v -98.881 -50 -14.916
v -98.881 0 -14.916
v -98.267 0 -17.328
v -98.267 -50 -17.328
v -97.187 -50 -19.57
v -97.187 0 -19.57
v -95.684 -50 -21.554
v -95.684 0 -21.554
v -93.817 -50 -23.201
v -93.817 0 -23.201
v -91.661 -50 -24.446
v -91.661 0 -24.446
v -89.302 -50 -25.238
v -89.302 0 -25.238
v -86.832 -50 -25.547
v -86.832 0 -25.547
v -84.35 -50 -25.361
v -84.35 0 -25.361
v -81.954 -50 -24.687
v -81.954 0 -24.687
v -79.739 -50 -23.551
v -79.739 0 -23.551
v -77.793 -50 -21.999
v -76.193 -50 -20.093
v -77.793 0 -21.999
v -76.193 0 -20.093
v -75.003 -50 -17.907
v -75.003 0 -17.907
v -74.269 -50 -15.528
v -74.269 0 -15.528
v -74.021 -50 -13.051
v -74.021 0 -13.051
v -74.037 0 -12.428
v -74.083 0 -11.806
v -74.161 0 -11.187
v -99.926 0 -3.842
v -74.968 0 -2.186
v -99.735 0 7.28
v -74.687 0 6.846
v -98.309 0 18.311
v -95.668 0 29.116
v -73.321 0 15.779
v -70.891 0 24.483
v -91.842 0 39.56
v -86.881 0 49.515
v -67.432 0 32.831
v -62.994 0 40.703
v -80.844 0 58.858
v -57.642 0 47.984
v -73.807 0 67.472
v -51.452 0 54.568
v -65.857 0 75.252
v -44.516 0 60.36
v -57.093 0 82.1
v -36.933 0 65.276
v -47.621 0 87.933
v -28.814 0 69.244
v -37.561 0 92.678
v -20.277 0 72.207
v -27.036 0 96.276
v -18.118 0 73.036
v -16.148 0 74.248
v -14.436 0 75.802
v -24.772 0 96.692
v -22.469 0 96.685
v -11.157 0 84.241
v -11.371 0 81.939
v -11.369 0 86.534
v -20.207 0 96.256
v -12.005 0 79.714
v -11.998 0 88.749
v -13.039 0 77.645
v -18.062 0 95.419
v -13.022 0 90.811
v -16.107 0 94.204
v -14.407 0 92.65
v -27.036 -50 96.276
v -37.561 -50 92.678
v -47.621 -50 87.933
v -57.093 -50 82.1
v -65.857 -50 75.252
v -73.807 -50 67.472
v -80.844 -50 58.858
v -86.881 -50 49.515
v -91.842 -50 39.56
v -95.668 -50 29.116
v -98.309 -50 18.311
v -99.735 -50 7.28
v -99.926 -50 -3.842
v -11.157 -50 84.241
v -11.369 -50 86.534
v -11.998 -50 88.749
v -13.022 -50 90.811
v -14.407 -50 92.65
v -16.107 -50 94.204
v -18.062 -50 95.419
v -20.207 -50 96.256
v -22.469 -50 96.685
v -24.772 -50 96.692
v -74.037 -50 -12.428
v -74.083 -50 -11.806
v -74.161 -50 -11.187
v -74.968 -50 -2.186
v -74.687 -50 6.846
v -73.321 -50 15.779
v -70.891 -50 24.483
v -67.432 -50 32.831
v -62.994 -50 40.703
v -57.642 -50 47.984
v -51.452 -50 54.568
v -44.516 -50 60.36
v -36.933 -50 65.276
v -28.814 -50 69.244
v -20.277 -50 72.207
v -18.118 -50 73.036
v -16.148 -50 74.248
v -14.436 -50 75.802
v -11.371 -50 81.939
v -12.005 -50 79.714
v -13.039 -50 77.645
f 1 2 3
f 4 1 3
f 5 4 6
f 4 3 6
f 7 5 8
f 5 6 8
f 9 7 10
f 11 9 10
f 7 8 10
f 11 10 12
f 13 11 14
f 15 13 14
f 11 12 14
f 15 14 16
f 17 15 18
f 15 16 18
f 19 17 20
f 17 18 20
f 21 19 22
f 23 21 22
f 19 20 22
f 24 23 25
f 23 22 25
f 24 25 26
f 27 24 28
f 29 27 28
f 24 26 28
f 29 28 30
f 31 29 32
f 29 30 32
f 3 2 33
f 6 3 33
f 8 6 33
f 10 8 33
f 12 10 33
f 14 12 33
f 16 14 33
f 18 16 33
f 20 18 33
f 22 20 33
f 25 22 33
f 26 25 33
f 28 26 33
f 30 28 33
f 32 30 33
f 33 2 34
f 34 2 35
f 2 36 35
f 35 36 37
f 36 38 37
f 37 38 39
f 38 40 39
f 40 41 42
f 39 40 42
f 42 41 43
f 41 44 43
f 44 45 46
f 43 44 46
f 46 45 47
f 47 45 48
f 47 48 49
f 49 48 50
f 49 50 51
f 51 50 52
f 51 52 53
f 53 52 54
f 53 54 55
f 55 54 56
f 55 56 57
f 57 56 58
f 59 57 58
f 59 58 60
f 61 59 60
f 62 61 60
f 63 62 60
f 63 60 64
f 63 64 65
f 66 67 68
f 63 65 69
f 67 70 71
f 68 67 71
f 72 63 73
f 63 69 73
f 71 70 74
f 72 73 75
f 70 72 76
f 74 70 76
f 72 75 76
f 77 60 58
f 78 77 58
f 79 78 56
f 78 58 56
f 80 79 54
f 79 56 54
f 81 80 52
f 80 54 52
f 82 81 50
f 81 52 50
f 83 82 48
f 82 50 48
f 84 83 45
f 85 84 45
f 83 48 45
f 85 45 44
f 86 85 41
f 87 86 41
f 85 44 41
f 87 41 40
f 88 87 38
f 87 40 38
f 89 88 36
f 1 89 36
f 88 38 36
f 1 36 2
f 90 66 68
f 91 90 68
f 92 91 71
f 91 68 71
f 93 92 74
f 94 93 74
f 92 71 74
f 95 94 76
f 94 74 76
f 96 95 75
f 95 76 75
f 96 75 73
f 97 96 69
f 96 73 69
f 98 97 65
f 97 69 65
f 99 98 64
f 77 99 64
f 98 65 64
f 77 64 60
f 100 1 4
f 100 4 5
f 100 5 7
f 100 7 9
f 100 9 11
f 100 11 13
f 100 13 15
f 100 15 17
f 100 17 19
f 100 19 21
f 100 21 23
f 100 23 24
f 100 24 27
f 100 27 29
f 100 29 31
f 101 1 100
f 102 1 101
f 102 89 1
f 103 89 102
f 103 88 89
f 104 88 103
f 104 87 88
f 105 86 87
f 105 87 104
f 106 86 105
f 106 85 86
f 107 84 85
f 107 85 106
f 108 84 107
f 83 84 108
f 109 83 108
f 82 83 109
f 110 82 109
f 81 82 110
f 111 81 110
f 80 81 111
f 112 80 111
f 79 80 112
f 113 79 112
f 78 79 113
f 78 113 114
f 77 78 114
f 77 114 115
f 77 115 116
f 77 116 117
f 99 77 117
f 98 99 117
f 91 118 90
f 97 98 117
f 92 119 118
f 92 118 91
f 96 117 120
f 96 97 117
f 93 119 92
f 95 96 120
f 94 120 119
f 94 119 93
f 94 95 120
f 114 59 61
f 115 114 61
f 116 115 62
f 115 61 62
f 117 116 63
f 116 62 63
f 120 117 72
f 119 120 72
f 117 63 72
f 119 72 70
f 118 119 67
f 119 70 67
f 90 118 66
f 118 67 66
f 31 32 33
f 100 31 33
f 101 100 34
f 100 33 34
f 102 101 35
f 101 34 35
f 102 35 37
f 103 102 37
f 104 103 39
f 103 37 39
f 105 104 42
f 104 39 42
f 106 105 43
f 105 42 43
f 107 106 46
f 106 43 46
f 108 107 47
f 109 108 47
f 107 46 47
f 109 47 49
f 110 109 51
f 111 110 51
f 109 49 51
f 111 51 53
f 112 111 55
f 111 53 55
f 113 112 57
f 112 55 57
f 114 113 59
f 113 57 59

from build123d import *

# Parameters (mm, degrees)
F0_R     = 7.5
F2_DEPTH = 50


with BuildPart() as f2:
    # F0 (on Front) → F2 (new body)
    with BuildSketch(Plane.XZ):
        with BuildLine():
            ThreePointArc((-20.2771231268, 72.2069129495), (-35.691129754, 80.8618774554), (-27.0361647105, 96.2758837807))
            ThreePointArc((-27.0361647105, 96.2758837807), (-83.9922641187, 54.2706142236), (-98.8813425816, -14.9157664658))
            ThreePointArc((-98.8813425816, -14.9157664658), (-88.3856453807, -0.6911276961), (-74.161006875, -11.1868252548))
            ThreePointArc((-74.161006875, -11.1868252548), (-62.9941980859, 40.7029606726), (-20.2771231268, 72.2069129495))
        make_face()
        with BuildLine():
            ThreePointArc((-11.1566443384, 84.2413982472), (-16.1066113799, 94.2036772197), (-27.0361647105, 96.2758837807))
            ThreePointArc((-27.0361647105, 96.2758837807), (-35.691129754, 80.8618774554), (-20.2771231268, 72.2069129495))
            ThreePointArc((-20.2771231268, 72.2069129495), (-13.6943651026, 76.6913656362), (-11.1566443384, 84.2413982472))
        make_face()
        with Locations((-23.6566443384, 84.2413982472)):
            Circle(F0_R, mode=Mode.SUBTRACT)
        with BuildLine():
            ThreePointArc((-74.161006875, -11.1868252548), (-88.3856453807, -0.6911276961), (-98.8813425816, -14.9157664658))
            ThreePointArc((-98.8813425816, -14.9157664658), (-85.5863211984, -25.5162884811), (-74.0211747752, -13.0512955493))
            ThreePointArc((-74.0211747752, -13.0512955493), (-74.0561818199, -12.1164422861), (-74.161006875, -11.1868252548))
        make_face()
        with Locations((-86.5211747752, -13.0512955493)):
            Circle(F0_R, mode=Mode.SUBTRACT)
        with Locations((-23.6566443384, 84.2413982472)):
            Circle(F0_R)
        with Locations((-86.5211747752, -13.0512955493)):
            Circle(F0_R)
    extrude(amount=F2_DEPTH)


solid = f2.part
